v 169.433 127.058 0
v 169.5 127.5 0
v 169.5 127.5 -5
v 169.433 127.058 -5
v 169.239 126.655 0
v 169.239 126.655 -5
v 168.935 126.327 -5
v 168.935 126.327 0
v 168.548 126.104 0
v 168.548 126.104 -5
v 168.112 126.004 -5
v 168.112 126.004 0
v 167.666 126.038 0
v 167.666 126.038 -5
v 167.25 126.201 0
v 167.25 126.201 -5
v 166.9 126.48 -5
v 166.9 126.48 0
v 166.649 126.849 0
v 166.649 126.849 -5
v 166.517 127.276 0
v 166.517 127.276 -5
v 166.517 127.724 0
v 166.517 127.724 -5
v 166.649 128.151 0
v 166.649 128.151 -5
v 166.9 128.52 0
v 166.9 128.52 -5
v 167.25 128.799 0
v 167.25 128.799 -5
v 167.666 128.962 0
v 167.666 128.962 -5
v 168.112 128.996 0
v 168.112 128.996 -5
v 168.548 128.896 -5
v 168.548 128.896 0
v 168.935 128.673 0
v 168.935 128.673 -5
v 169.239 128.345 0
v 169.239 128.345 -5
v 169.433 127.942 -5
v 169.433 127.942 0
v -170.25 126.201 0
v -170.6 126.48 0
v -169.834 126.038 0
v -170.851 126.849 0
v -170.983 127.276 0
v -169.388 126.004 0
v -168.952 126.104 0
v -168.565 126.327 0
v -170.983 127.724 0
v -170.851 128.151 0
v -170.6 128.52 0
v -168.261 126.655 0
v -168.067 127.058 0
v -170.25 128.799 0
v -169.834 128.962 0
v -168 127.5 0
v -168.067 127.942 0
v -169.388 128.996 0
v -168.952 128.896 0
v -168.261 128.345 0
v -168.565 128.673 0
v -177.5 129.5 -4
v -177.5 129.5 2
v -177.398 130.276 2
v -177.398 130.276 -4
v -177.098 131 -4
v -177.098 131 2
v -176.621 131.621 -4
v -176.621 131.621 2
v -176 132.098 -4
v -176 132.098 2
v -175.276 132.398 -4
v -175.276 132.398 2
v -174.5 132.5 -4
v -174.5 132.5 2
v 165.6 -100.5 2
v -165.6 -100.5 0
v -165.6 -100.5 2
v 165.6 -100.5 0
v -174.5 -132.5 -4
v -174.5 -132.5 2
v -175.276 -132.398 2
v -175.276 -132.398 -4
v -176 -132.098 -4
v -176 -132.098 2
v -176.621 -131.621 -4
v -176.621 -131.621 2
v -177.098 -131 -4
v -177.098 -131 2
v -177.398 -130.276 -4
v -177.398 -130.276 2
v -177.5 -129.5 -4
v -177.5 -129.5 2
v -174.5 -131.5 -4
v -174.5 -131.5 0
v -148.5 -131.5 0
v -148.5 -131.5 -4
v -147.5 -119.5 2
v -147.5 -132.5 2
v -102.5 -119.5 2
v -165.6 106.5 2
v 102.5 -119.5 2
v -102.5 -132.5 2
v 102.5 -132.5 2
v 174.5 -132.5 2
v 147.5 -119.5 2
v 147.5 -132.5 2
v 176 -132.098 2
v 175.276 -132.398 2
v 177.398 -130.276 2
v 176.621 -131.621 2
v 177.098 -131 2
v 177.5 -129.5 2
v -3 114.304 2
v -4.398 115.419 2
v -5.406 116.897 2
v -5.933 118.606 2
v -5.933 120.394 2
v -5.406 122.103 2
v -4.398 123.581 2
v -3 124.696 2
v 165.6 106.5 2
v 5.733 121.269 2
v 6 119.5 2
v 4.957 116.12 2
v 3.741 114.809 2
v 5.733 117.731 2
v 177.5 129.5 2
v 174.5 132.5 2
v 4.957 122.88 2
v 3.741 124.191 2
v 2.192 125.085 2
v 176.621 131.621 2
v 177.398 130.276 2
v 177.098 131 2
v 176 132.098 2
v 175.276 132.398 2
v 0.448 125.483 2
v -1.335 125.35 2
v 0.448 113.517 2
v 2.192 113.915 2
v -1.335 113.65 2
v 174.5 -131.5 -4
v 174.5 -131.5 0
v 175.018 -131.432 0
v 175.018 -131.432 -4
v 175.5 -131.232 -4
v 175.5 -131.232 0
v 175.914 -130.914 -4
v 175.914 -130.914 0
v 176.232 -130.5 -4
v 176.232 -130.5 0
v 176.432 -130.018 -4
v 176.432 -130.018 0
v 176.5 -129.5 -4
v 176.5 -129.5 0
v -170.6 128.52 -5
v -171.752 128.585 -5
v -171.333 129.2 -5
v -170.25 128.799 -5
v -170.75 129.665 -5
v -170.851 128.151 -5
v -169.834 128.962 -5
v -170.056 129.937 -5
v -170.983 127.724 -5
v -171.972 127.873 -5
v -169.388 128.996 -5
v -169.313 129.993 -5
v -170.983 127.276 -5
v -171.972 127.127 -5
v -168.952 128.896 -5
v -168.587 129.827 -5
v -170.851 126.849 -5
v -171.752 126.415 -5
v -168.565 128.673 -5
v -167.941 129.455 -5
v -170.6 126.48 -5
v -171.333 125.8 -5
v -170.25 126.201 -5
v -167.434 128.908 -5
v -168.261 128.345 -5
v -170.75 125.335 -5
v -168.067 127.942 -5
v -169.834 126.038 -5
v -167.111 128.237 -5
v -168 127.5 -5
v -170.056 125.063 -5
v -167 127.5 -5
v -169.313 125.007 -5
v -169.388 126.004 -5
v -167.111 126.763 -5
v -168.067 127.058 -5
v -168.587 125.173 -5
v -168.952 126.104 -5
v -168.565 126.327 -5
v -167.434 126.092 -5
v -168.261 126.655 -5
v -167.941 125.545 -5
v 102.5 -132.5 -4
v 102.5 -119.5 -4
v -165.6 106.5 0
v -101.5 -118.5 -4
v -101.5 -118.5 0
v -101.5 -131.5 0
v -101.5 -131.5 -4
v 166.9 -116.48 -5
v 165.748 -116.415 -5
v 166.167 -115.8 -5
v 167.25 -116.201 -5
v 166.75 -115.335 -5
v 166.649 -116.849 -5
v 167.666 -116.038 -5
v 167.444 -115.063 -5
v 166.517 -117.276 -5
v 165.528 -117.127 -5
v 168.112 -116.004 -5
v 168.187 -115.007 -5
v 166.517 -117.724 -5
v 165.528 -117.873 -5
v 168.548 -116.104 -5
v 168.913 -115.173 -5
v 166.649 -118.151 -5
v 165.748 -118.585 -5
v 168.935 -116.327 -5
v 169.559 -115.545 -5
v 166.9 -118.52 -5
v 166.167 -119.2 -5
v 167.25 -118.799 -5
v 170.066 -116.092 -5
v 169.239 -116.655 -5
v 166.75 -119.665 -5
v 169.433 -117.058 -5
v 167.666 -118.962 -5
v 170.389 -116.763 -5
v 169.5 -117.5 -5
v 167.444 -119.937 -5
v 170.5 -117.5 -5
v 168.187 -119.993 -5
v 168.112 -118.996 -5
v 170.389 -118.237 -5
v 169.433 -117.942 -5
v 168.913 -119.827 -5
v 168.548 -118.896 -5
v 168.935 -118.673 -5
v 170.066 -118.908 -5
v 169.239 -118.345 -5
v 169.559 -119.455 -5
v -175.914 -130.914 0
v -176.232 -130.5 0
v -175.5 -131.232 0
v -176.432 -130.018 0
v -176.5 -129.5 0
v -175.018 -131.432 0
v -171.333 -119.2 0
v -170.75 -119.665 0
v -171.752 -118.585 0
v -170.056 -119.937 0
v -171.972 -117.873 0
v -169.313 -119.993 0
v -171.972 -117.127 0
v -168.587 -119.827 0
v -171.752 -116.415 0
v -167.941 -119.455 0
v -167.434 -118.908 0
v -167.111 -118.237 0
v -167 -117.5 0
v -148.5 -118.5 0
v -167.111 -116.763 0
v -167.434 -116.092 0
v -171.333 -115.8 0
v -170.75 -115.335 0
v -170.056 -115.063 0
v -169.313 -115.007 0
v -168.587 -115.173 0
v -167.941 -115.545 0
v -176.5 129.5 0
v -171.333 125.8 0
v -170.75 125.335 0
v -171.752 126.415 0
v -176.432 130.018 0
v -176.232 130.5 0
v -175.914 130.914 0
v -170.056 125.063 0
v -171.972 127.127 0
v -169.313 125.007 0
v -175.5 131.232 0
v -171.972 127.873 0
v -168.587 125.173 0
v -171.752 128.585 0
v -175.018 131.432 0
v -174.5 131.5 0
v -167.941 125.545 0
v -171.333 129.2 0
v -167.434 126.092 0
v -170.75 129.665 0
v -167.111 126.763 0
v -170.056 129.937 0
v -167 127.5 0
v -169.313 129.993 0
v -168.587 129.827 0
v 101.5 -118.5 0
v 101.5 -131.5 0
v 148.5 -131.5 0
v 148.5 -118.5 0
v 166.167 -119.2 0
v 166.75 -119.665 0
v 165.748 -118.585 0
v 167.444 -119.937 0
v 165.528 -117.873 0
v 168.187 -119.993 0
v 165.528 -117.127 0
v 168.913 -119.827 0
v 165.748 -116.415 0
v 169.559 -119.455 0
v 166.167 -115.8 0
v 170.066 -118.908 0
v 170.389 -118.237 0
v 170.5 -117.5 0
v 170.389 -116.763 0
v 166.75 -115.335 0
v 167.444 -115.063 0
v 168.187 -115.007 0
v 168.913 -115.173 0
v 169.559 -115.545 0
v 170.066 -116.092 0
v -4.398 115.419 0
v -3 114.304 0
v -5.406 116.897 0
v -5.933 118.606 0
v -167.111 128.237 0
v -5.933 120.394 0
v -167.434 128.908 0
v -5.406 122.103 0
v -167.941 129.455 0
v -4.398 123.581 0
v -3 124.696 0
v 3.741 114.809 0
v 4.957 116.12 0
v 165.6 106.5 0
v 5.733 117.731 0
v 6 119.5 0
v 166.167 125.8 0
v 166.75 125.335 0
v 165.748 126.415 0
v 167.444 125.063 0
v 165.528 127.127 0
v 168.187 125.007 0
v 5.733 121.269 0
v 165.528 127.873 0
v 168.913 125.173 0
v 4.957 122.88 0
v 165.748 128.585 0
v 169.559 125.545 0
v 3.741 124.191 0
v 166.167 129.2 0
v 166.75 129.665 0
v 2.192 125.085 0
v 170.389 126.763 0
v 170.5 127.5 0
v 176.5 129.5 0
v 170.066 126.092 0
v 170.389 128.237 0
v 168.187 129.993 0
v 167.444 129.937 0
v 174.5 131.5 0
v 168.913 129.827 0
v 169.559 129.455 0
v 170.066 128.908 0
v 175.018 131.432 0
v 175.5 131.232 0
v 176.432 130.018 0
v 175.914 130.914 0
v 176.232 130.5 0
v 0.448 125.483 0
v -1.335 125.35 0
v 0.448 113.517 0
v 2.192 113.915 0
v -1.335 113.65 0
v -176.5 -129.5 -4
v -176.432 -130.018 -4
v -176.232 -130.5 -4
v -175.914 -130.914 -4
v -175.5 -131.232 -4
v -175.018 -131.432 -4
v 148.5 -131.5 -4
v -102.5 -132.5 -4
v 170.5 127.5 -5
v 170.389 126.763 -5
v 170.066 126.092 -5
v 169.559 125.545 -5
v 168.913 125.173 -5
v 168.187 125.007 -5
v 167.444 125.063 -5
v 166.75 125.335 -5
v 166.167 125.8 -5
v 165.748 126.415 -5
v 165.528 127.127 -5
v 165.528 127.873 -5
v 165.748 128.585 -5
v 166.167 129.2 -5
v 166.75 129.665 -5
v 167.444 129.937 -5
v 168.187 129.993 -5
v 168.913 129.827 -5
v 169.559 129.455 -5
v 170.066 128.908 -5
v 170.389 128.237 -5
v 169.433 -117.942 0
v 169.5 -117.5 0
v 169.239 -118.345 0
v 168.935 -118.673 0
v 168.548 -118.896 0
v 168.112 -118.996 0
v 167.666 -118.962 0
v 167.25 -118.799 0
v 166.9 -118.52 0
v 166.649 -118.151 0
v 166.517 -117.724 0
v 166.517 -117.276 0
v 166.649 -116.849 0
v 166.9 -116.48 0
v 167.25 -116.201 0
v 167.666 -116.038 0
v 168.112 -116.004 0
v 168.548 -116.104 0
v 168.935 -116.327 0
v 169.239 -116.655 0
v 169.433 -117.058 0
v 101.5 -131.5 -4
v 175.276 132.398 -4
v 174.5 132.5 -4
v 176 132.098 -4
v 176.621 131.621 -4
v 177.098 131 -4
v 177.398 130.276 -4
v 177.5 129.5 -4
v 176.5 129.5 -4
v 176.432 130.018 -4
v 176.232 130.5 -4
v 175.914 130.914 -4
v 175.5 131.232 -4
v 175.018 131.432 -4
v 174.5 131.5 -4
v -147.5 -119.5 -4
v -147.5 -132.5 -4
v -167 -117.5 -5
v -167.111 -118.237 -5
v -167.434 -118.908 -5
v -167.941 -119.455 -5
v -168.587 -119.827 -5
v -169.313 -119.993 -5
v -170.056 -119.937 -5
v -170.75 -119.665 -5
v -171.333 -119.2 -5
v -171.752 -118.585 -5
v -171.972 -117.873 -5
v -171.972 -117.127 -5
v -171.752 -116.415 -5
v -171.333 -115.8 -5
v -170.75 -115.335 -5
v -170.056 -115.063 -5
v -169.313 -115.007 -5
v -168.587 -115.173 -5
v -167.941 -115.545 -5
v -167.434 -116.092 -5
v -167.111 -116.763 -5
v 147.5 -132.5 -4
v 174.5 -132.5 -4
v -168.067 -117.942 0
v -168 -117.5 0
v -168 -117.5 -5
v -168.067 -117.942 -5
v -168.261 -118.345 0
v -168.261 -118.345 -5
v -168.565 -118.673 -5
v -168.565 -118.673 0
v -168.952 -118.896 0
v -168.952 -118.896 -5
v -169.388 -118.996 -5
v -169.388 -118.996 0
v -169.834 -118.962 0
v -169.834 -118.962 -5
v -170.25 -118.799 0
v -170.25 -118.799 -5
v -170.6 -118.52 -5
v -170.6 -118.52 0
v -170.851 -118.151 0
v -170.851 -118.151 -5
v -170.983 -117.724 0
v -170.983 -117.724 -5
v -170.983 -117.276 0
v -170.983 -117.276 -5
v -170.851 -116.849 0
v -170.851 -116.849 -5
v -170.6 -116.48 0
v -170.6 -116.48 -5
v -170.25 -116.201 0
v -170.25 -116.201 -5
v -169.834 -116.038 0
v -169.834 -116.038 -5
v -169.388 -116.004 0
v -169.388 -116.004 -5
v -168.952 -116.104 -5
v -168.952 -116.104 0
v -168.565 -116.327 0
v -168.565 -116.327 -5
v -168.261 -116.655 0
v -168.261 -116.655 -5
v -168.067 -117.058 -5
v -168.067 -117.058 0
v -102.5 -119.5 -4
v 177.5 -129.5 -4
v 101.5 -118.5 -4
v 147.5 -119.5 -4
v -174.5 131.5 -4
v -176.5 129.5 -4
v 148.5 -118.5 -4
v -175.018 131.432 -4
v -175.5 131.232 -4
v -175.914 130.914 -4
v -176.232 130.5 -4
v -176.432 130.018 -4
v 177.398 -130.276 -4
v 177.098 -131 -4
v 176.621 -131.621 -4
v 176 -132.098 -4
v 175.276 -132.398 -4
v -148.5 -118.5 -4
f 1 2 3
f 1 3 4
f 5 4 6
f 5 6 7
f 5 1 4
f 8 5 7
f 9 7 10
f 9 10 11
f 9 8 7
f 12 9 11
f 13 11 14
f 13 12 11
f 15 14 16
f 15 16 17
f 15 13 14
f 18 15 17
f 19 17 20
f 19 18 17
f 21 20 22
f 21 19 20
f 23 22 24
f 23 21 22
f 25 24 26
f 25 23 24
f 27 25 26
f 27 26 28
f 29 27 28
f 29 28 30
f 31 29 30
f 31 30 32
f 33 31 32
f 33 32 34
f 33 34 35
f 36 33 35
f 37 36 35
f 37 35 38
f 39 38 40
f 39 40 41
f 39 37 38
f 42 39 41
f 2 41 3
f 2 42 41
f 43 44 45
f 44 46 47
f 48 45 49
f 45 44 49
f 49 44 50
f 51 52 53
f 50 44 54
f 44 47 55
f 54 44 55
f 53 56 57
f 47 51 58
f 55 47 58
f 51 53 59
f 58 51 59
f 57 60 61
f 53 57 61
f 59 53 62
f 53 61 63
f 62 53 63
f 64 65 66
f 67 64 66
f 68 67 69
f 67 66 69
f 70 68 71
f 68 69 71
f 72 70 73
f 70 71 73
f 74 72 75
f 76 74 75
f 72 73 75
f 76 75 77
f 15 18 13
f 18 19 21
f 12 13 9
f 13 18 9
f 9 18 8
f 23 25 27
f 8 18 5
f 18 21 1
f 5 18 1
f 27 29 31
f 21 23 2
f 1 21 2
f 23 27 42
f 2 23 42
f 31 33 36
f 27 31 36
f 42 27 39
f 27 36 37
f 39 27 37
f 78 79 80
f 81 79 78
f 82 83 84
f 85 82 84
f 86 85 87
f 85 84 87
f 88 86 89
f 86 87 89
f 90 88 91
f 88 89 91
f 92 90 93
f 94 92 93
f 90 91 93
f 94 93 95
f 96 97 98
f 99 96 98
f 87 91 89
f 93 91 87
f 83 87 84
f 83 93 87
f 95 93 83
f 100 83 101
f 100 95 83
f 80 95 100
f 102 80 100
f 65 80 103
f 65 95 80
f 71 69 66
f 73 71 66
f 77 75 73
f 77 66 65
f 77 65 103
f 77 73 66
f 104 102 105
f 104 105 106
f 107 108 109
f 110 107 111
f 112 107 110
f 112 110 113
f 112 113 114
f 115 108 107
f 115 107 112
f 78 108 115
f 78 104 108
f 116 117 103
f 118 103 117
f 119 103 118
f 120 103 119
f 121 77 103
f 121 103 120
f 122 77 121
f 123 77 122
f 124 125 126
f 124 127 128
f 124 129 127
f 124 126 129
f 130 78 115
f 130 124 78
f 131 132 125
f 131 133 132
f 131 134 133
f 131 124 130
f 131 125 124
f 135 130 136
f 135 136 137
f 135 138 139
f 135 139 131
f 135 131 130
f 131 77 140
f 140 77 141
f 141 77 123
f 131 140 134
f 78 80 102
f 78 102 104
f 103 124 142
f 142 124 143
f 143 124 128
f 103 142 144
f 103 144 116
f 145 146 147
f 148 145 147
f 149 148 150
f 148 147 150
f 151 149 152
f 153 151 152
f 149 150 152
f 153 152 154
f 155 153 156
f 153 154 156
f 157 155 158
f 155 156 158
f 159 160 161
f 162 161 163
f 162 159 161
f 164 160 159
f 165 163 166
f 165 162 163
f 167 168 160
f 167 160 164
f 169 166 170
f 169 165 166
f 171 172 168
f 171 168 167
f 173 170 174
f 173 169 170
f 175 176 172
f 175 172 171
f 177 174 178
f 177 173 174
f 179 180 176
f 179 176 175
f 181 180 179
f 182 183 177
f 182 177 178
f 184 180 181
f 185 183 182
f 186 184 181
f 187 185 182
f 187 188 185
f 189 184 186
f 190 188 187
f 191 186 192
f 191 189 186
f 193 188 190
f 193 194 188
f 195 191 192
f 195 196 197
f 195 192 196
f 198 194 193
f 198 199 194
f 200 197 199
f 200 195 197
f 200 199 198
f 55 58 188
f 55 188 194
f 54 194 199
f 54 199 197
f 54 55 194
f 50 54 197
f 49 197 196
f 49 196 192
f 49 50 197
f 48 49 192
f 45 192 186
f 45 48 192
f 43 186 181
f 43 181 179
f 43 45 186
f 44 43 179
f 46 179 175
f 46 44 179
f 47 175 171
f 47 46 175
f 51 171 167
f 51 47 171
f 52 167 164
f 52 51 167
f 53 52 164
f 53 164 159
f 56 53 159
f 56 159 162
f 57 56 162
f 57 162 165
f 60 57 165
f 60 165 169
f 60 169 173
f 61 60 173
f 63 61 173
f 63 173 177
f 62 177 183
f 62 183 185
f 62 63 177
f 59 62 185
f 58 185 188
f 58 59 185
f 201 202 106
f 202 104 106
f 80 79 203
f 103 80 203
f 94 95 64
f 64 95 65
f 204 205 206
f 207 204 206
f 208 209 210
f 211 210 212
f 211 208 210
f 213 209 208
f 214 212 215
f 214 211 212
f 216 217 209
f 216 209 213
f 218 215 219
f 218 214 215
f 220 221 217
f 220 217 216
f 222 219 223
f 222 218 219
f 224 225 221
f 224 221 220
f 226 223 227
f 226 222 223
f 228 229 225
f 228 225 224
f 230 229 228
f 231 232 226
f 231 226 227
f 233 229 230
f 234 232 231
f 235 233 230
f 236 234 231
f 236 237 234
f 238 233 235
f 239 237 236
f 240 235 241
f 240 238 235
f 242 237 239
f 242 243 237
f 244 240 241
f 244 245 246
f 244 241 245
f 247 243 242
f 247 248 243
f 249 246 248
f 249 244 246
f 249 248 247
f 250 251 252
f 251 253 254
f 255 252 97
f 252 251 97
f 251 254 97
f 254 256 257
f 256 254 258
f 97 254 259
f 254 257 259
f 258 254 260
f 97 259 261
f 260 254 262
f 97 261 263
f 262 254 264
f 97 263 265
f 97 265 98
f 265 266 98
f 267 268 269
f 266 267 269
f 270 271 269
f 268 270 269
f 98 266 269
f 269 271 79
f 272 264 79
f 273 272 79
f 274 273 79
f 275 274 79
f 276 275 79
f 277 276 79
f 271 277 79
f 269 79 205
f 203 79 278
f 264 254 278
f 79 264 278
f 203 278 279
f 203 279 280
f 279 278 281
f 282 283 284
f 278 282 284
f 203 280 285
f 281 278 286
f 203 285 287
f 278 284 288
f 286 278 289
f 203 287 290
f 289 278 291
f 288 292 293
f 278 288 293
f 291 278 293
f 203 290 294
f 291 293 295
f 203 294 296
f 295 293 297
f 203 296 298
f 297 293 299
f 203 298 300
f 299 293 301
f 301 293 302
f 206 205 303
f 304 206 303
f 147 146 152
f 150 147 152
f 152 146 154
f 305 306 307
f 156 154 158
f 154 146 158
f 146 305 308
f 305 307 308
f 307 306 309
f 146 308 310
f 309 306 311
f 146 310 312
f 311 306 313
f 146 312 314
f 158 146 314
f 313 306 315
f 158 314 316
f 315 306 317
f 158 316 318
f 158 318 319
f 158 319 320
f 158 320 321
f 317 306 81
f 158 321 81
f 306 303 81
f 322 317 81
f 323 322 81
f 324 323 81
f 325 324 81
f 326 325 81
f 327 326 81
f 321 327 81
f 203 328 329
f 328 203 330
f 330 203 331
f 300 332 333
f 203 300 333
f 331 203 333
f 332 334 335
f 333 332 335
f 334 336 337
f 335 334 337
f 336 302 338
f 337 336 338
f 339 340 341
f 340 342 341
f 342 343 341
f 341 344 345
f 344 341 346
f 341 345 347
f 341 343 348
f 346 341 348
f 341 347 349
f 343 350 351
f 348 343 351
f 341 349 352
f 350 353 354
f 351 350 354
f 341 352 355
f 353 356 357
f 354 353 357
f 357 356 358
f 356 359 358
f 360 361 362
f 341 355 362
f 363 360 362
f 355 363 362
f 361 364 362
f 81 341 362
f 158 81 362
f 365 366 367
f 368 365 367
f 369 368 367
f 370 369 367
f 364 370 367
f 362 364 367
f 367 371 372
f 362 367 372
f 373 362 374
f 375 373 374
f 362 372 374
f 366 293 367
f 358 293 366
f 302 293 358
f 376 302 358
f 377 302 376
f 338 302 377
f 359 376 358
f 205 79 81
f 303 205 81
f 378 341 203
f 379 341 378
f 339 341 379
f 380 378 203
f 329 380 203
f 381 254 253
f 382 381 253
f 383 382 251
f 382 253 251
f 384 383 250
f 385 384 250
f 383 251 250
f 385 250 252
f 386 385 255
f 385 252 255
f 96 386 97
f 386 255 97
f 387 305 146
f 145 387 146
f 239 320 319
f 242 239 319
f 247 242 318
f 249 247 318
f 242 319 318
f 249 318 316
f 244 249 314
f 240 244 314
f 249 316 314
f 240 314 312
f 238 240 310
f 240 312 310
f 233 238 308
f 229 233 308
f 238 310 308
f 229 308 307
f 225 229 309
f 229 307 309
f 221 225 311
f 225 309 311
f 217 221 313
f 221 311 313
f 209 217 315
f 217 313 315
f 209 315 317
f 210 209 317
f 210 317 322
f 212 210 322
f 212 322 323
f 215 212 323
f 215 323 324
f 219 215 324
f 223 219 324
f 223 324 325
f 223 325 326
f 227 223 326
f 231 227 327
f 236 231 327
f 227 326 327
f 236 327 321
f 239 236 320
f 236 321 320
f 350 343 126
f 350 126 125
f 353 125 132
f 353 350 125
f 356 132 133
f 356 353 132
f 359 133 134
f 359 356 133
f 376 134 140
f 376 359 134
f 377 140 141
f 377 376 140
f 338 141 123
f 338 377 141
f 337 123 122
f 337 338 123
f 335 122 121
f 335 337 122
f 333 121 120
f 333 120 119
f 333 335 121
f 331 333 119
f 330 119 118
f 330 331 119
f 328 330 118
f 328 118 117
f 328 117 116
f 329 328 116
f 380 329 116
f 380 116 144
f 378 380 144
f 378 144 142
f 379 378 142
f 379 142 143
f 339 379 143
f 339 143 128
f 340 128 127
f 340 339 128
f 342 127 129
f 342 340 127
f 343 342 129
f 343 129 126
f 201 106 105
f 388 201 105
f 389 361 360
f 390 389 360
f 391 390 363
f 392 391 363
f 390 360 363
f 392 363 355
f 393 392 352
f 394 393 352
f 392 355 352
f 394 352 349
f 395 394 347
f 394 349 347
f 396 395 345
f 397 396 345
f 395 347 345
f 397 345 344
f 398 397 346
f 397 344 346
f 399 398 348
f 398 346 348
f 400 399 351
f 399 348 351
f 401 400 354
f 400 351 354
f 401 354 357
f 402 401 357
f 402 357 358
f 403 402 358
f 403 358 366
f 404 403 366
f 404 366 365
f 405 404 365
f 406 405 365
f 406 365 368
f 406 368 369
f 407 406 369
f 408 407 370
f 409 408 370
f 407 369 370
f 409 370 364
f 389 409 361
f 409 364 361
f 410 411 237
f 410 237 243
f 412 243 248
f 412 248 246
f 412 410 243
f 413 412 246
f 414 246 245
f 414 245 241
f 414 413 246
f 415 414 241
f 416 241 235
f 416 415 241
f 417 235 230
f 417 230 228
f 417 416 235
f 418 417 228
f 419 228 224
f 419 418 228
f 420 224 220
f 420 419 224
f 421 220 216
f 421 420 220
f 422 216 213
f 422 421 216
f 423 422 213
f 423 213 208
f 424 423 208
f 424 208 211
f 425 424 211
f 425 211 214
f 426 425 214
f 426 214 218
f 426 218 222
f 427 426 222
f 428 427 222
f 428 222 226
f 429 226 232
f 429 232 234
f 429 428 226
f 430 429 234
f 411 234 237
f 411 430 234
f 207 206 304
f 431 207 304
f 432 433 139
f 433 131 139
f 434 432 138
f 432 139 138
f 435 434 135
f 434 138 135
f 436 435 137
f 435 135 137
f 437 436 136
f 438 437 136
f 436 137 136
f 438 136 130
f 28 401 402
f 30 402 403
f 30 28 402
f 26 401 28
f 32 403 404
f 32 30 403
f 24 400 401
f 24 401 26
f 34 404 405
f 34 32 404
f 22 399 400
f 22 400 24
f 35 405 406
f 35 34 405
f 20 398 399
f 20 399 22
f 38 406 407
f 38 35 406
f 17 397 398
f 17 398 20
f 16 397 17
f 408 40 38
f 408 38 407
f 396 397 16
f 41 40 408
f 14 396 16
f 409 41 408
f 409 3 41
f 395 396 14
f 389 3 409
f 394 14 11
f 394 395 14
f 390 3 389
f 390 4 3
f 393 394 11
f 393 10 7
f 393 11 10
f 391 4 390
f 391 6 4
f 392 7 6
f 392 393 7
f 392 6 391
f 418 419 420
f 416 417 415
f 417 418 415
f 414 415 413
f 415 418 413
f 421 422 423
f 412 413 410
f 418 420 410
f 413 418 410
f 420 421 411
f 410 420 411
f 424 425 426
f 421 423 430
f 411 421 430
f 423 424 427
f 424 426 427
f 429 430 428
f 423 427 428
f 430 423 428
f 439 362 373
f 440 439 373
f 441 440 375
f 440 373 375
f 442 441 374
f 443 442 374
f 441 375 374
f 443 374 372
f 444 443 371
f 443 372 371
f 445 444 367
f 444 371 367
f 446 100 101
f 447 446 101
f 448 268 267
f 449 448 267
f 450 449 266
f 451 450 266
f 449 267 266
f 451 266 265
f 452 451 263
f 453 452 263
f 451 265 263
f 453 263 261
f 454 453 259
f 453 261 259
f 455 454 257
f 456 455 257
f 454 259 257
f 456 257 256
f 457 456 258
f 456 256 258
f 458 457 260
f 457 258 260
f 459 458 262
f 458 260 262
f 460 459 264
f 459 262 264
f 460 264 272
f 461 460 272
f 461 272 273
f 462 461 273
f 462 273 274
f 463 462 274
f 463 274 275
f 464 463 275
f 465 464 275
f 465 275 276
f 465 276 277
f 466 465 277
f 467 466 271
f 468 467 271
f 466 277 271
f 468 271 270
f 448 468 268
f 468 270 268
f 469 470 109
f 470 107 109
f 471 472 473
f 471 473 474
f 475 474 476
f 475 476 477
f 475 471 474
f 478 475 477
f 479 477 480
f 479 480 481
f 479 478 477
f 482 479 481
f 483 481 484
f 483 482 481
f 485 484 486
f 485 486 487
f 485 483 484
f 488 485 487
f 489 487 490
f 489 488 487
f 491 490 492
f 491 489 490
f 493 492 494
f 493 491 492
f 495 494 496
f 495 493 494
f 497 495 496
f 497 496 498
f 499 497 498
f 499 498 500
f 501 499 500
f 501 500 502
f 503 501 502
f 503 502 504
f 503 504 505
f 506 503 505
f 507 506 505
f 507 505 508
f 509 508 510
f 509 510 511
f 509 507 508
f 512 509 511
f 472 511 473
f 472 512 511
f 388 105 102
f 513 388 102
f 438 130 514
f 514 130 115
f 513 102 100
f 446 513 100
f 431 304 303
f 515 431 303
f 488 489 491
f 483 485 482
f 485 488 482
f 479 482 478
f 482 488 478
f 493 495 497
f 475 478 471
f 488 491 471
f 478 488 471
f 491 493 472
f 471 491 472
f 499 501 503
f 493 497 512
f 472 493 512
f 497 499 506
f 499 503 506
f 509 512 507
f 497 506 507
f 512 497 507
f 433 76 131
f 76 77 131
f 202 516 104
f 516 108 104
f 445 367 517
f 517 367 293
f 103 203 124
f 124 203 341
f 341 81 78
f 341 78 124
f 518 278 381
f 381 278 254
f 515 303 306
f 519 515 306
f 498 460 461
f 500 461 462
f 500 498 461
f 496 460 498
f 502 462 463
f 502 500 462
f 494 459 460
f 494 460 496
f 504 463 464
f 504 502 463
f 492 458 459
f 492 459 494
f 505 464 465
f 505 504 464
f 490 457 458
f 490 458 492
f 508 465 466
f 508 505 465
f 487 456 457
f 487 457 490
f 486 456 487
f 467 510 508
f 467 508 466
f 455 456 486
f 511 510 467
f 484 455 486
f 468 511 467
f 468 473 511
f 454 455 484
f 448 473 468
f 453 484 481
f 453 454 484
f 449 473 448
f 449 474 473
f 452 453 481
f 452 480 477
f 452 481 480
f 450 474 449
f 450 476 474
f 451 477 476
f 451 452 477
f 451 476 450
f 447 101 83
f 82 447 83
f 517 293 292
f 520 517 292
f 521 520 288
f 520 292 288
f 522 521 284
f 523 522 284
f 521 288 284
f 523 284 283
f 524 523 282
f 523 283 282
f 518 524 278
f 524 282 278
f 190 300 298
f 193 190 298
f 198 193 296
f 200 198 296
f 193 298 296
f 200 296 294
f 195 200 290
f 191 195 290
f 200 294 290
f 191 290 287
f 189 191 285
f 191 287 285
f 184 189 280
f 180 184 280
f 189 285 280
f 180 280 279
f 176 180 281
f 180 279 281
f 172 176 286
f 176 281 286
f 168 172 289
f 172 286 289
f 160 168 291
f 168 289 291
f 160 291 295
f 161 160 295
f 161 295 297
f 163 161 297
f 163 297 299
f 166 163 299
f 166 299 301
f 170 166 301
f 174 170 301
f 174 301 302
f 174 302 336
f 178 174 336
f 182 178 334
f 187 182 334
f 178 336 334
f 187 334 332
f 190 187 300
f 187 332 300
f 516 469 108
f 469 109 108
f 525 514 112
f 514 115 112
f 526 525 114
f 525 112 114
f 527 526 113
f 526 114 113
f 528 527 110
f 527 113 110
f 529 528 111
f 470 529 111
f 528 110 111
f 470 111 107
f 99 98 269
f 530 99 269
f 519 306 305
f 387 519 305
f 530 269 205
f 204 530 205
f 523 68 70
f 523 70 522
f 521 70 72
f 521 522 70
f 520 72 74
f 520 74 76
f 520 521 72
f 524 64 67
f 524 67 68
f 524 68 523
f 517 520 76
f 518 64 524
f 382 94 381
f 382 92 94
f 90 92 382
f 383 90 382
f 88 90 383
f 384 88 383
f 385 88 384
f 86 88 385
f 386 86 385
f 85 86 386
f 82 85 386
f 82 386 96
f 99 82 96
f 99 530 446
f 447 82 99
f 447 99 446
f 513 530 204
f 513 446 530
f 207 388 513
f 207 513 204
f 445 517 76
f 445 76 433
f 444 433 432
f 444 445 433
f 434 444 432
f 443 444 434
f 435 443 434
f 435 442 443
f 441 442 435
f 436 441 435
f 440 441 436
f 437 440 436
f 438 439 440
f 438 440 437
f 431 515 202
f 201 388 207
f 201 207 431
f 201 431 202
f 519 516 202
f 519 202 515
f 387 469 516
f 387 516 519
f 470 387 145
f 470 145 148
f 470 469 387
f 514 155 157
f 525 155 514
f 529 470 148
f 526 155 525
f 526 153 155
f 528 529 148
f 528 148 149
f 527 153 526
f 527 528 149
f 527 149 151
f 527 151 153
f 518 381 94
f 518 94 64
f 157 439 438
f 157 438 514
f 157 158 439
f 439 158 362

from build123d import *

# Parameters (mm, degrees)
F0_W     = 331.2
F0_H     = 207
F0_R     = 6
F1_DEPTH = 2
F2_R     = 2.5
F2_R_2   = 1.5
F3_DEPTH = 5
F5_DEPTH = 4


with BuildPart() as f1:
    # F0 (on Top) → F1 (new body)
    with BuildSketch(Plane.XY):
        with BuildLine():
            ThreePointArc((177.5, 129.5), (176.62132, 131.62132), (174.5, 132.5))
            Line((174.5, 132.5), (-174.5, 132.5))
            ThreePointArc((-174.5, 132.5), (-176.62132, 131.62132), (-177.5, 129.5))
            Line((-177.5, 129.5), (-177.5, -129.5))
            ThreePointArc((-177.5, -129.5), (-176.62132, -131.62132), (-174.5, -132.5))
            Line((-174.5, -132.5), (-147.5, -132.5))
            Line((-147.5, -132.5), (-147.5, -119.5))
            Line((-147.5, -119.5), (-102.5, -119.5))
            Line((-102.5, -119.5), (-102.5, -132.5))
            Line((-102.5, -132.5), (102.5, -132.5))
            Line((102.5, -132.5), (102.5, -119.5))
            Line((102.5, -119.5), (147.5, -119.5))
            Line((147.5, -119.5), (147.5, -132.5))
            Line((147.5, -132.5), (174.5, -132.5))
            ThreePointArc((174.5, -132.5), (176.62132, -131.62132), (177.5, -129.5))
            Line((177.5, -129.5), (177.5, 129.5))
        make_face()
        with Locations((0, 3)):
            Rectangle(F0_W, F0_H, mode=Mode.SUBTRACT)
        with Locations((0, 119.5)):
            Circle(F0_R, mode=Mode.SUBTRACT)
    extrude(amount=F1_DEPTH)

    # F2 (on face) → F3 (join)
    with BuildSketch(Plane(origin=(0, 0, 0), x_dir=(1, 0, 0), z_dir=(0, 0, -1))):
        with Locations((-169.5, 117.5)):
            Circle(F2_R)
        with Locations((-169.5, 117.5)):
            Circle(F2_R_2, mode=Mode.SUBTRACT)
        with Locations((168, 117.5)):
            Circle(F2_R)
        with Locations((168, 117.5)):
            Circle(F2_R_2, mode=Mode.SUBTRACT)
        with Locations((-169.5, -127.5)):
            Circle(F2_R)
        with Locations((-169.5, -127.5)):
            Circle(F2_R_2, mode=Mode.SUBTRACT)
        with Locations((168, -127.5)):
            Circle(F2_R)
        with Locations((168, -127.5)):
            Circle(F2_R_2, mode=Mode.SUBTRACT)
    extrude(amount=F3_DEPTH)

    # F4 (on face) → F5 (join)
    with BuildSketch(Plane(origin=(0, 0, 0), x_dir=(1, 0, 0), z_dir=(0, 0, -1))):
        with BuildLine():
            ThreePointArc((-177.5, -129.5), (-176.62132, -131.62132), (-174.5, -132.5))
            Line((-174.5, -132.5), (174.5, -132.5))
            ThreePointArc((174.5, -132.5), (176.62132, -131.62132), (177.5, -129.5))
            Line((177.5, -129.5), (177.5, 129.5))
            ThreePointArc((177.5, 129.5), (176.62132, 131.62132), (174.5, 132.5))
            Line((174.5, 132.5), (147.5, 132.5))
            Line((147.5, 132.5), (147.5, 119.5))
            Line((147.5, 119.5), (102.5, 119.5))
            Line((102.5, 119.5), (102.5, 132.5))
            Line((102.5, 132.5), (-102.5, 132.5))
            Line((-102.5, 132.5), (-102.5, 119.5))
            Line((-102.5, 119.5), (-147.5, 119.5))
            Line((-147.5, 119.5), (-147.5, 132.5))
            Line((-147.5, 132.5), (-174.5, 132.5))
            ThreePointArc((-174.5, 132.5), (-176.62132, 131.62132), (-177.5, 129.5))
            Line((-177.5, 129.5), (-177.5, -129.5))
        make_face()
        with BuildLine():
            ThreePointArc((-174.5, -131.5), (-175.914214, -130.914214), (-176.5, -129.5))
            Line((-176.5, -129.5), (-176.5, 129.5))
            ThreePointArc((-176.5, 129.5), (-175.914214, 130.914214), (-174.5, 131.5))
            Line((-174.5, 131.5), (-148.5, 131.5))
            Line((-148.5, 131.5), (-148.5, 118.5))
            Line((-148.5, 118.5), (-101.5, 118.5))
            Line((-101.5, 118.5), (-101.5, 131.5))
            Line((-101.5, 131.5), (101.5, 131.5))
            Line((101.5, 131.5), (101.5, 118.5))
            Line((101.5, 118.5), (148.5, 118.5))
            Line((148.5, 118.5), (148.5, 131.5))
            Line((148.5, 131.5), (174.5, 131.5))
            ThreePointArc((174.5, 131.5), (175.914214, 130.914214), (176.5, 129.5))
            Line((176.5, 129.5), (176.5, -129.5))
            ThreePointArc((176.5, -129.5), (175.914214, -130.914214), (174.5, -131.5))
            Line((174.5, -131.5), (-174.5, -131.5))
        make_face(mode=Mode.SUBTRACT)
    extrude(amount=F5_DEPTH)


solid = f1.part
